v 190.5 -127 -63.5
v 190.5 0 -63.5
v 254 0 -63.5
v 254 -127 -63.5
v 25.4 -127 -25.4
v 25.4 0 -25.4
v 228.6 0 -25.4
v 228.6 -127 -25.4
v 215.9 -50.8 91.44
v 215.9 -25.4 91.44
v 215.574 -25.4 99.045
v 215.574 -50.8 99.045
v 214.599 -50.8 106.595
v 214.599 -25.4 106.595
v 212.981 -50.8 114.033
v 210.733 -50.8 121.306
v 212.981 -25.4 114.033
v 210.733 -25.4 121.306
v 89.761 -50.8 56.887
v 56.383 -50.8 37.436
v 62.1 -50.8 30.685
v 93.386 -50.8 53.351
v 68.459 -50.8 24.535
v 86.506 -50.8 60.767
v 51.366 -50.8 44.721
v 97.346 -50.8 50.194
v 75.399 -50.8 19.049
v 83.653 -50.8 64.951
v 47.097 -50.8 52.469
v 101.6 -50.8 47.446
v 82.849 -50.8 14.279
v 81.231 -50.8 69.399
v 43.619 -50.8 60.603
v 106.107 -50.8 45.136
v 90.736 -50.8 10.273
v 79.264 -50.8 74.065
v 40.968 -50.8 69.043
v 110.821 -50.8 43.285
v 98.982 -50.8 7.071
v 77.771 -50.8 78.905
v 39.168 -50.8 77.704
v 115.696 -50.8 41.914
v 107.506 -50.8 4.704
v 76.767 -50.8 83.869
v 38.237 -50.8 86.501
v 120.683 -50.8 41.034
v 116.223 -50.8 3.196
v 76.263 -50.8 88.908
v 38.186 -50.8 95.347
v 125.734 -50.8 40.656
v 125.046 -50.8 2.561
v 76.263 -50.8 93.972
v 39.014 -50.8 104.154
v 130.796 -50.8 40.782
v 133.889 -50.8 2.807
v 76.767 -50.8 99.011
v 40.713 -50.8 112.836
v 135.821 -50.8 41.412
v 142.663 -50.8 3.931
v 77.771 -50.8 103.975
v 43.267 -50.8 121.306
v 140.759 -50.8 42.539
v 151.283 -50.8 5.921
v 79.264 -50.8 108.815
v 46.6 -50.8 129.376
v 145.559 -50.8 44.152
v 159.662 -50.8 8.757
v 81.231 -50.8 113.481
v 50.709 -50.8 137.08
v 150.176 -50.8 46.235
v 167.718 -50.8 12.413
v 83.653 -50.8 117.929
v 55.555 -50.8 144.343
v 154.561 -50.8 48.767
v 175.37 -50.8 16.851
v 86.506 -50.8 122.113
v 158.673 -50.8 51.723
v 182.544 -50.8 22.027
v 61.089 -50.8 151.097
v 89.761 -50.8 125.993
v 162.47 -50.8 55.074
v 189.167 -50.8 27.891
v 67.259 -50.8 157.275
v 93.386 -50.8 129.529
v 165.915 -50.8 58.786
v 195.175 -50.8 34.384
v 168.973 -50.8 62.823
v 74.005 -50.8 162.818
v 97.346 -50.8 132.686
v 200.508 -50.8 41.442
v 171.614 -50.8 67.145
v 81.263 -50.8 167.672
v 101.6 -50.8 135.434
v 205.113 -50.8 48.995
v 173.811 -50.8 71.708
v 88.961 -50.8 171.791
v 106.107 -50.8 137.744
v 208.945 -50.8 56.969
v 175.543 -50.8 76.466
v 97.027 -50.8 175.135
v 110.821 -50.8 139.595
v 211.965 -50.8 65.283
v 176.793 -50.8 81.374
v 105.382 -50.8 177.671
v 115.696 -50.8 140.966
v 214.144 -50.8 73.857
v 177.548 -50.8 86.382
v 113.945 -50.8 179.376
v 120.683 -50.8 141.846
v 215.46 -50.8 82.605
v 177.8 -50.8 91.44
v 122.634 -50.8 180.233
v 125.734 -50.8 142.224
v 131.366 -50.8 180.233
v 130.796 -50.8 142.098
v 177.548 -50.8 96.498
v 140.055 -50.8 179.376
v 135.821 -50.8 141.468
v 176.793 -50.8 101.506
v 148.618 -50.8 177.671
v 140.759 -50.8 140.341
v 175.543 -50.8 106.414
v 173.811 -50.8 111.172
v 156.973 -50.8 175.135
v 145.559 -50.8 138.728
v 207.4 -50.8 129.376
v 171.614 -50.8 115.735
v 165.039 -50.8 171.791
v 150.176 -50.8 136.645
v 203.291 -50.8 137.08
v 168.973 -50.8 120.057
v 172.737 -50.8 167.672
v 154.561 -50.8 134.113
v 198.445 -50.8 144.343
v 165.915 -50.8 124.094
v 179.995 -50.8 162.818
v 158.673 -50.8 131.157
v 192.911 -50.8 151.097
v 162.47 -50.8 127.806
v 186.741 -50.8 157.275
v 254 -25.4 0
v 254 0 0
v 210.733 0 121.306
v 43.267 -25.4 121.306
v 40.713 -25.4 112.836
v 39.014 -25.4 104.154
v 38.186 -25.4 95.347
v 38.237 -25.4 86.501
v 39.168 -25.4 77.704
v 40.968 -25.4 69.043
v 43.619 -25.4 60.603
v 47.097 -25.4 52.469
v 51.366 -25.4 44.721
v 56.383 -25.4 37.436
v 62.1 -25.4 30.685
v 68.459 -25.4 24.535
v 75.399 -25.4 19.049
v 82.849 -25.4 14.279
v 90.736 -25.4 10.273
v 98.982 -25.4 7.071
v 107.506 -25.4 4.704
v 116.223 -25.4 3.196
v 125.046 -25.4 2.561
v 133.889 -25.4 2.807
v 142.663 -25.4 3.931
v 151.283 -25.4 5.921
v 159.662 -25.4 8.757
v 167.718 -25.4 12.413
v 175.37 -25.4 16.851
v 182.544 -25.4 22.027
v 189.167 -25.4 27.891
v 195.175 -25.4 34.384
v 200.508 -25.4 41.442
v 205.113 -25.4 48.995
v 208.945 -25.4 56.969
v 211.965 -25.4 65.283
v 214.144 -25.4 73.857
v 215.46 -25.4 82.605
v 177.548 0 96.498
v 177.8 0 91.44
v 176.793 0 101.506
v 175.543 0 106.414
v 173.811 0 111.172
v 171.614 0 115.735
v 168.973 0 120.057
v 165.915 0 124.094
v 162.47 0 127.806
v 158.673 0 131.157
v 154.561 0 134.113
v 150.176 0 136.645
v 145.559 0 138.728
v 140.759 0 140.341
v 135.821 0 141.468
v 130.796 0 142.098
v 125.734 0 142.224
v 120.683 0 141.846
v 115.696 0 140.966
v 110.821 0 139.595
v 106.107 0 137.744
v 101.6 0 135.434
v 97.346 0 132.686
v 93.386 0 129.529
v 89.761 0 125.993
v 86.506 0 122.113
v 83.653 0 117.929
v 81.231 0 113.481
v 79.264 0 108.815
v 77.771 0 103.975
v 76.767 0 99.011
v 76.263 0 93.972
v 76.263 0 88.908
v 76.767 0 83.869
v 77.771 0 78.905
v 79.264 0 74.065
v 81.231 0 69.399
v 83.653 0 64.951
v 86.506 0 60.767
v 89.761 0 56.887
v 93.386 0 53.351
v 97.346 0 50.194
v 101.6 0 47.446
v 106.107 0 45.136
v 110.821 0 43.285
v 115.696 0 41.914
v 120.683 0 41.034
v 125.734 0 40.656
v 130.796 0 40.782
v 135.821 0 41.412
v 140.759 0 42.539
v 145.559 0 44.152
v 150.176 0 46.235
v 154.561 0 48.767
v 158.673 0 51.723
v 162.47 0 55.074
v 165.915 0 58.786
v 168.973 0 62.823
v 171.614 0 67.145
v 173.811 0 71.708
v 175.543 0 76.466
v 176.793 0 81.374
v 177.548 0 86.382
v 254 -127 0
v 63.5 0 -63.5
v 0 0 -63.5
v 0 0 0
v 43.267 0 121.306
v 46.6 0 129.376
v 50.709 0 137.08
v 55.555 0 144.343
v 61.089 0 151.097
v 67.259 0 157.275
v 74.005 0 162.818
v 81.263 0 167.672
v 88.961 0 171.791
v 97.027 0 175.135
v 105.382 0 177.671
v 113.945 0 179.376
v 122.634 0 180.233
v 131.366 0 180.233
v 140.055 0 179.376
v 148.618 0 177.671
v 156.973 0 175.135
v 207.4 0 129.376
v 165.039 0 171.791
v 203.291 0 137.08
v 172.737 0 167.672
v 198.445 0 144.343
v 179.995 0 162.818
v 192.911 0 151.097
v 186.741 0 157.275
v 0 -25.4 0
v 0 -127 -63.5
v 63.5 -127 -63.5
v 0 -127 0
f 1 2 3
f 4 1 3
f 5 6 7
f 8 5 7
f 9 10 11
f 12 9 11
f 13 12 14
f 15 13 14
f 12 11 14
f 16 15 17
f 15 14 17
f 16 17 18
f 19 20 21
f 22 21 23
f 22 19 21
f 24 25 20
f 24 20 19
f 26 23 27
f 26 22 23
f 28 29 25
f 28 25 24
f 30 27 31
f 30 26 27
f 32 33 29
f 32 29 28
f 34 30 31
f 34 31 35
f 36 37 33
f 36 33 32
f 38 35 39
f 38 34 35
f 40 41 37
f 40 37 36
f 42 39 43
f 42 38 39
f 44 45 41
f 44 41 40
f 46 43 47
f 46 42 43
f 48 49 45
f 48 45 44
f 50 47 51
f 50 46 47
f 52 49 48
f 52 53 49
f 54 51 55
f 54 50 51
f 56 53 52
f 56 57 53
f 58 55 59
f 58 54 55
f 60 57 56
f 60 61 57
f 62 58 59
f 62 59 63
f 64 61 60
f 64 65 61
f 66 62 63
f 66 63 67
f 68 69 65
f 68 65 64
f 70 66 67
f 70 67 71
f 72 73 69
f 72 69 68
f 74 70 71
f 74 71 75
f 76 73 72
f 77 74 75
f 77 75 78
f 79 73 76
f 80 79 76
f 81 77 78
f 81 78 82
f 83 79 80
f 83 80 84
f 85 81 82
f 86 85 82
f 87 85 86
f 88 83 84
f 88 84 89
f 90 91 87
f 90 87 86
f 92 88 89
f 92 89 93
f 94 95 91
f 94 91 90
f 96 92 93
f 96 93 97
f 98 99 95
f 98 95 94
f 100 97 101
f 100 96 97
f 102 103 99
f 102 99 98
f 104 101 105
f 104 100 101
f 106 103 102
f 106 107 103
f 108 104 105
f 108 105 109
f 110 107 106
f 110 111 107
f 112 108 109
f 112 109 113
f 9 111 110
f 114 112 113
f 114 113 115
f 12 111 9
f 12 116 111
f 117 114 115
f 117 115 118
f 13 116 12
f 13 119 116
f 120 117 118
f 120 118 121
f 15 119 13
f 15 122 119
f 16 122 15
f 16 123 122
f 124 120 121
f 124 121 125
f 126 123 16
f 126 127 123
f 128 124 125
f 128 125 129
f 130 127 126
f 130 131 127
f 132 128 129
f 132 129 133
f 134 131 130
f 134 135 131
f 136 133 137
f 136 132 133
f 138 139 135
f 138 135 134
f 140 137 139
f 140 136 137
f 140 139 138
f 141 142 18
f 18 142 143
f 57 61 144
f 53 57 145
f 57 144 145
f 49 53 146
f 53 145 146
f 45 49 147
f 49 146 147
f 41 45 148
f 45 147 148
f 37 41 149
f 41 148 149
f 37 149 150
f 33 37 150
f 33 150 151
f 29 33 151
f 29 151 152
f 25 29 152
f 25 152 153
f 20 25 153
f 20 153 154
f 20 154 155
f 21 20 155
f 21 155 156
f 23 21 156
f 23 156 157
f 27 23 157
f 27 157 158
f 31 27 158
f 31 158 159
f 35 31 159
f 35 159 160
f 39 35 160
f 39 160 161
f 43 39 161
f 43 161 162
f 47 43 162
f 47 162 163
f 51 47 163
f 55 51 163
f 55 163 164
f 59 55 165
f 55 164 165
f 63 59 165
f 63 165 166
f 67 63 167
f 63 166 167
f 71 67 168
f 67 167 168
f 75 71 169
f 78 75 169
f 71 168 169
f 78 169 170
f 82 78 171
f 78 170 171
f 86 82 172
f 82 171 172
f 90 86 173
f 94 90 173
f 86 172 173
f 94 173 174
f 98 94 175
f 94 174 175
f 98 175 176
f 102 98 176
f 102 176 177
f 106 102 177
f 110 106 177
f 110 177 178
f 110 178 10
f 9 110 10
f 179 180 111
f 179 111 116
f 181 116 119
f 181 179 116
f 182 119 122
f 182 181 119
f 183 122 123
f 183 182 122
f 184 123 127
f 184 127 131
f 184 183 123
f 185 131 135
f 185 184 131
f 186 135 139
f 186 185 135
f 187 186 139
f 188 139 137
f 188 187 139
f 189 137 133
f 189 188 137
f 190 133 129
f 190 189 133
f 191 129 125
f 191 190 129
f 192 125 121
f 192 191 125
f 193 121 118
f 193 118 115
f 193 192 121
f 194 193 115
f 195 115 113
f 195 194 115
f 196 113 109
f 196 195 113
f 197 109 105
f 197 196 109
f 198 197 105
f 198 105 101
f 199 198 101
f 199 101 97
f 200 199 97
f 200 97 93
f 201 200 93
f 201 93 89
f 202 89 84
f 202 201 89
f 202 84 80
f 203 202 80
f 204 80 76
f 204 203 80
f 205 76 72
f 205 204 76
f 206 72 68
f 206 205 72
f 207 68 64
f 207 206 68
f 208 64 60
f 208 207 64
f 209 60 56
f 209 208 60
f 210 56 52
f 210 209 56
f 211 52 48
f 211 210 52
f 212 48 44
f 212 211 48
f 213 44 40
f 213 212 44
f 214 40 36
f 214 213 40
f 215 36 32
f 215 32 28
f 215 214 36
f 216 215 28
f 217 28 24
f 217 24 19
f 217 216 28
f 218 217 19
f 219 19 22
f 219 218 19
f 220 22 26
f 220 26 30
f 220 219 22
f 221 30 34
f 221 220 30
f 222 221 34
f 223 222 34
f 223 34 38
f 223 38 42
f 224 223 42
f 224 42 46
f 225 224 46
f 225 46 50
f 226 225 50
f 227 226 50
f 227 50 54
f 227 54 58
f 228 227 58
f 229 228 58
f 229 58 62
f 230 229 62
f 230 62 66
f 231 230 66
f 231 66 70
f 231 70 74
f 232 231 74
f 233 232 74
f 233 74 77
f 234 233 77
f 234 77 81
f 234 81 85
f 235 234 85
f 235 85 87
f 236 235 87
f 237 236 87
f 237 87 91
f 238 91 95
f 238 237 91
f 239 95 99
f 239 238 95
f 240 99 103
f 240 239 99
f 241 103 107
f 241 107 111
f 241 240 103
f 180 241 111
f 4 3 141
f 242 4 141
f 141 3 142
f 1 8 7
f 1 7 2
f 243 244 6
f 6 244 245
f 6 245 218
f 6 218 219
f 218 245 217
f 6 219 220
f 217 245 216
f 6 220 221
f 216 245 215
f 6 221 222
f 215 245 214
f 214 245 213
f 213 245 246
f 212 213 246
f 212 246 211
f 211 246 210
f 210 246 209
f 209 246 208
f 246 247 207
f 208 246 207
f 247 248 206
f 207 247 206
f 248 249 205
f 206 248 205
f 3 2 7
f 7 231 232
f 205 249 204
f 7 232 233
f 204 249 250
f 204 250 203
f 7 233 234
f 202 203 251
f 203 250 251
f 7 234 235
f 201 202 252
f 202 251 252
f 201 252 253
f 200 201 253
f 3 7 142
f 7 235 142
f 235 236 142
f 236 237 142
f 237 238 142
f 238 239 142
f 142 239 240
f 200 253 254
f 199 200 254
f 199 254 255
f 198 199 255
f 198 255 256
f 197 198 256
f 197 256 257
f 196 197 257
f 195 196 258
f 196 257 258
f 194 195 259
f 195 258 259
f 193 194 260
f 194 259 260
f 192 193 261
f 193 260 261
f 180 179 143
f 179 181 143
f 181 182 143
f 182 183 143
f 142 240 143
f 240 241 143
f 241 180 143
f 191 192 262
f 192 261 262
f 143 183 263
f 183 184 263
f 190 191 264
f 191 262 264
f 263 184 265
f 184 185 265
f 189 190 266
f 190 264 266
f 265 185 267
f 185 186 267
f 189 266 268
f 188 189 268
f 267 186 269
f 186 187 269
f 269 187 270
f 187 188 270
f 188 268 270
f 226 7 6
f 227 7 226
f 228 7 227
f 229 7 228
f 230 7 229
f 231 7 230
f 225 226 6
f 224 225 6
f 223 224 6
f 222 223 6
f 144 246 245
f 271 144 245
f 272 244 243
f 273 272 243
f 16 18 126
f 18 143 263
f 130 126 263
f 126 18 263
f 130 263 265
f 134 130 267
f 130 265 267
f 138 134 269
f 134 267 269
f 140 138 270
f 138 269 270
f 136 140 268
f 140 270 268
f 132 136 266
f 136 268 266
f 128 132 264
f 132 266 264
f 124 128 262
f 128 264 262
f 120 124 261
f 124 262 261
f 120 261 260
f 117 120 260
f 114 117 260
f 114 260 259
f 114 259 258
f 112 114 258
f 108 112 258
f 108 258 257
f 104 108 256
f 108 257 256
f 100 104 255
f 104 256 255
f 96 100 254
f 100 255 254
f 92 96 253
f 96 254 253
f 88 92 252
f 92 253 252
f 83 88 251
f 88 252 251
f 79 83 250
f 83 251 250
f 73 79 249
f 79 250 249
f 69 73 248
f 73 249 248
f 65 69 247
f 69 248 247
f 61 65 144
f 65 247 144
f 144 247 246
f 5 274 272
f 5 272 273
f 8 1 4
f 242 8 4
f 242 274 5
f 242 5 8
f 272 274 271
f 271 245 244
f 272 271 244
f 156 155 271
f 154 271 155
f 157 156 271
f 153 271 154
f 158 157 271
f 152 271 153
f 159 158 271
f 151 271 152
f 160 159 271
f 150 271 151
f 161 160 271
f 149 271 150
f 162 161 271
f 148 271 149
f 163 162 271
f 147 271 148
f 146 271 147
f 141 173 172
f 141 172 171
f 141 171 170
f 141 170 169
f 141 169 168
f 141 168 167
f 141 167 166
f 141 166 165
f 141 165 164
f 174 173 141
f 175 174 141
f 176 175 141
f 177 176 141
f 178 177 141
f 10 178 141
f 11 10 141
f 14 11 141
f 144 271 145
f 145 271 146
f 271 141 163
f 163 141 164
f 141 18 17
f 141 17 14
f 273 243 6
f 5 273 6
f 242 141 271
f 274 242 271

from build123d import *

# Parameters (mm, degrees)
F1_DEPTH = 127
F2_DEPTH = 25.4
F0_R     = 50.8
F3_DEPTH = 50.8


with BuildPart() as f1:
    # F0 (on Front) → F1 (new body)
    with BuildSketch(Plane.XZ):
        Polygon((254, 0), (0, 0), (0, -63.5), (63.5, -63.5), (25.4, -25.4), (228.6, -25.4), (190.5, -63.5), (254, -63.5), align=None)
    extrude(amount=F1_DEPTH)

    # F0 (on Front) → F2 (join)
    with BuildSketch(Plane.XZ):
        with BuildLine():
            Line((43.266761, 121.30561), (0, 0))
            Line((0, 0), (254, 0))
            Line((254, 0), (210.733239, 121.30561))
            ThreePointArc((210.733239, 121.30561), (214.598787, 106.59462), (215.9, 91.44))
            ThreePointArc((215.9, 91.44), (111.84538, 3.841213), (43.266761, 121.30561))
        make_face()
    extrude(amount=F2_DEPTH)

    # F0 (on Front) → F3 (join)
    with BuildSketch(Plane.XZ):
        with BuildLine():
            ThreePointArc((210.733239, 121.30561), (127, 180.34), (43.266761, 121.30561))
            ThreePointArc((43.266761, 121.30561), (111.84538, 3.841213), (215.9, 91.44))
            ThreePointArc((215.9, 91.44), (214.598787, 106.59462), (210.733239, 121.30561))
        make_face()
        with Locations((127, 91.44)):
            Circle(F0_R, mode=Mode.SUBTRACT)
    extrude(amount=F3_DEPTH)


solid = f1.part
